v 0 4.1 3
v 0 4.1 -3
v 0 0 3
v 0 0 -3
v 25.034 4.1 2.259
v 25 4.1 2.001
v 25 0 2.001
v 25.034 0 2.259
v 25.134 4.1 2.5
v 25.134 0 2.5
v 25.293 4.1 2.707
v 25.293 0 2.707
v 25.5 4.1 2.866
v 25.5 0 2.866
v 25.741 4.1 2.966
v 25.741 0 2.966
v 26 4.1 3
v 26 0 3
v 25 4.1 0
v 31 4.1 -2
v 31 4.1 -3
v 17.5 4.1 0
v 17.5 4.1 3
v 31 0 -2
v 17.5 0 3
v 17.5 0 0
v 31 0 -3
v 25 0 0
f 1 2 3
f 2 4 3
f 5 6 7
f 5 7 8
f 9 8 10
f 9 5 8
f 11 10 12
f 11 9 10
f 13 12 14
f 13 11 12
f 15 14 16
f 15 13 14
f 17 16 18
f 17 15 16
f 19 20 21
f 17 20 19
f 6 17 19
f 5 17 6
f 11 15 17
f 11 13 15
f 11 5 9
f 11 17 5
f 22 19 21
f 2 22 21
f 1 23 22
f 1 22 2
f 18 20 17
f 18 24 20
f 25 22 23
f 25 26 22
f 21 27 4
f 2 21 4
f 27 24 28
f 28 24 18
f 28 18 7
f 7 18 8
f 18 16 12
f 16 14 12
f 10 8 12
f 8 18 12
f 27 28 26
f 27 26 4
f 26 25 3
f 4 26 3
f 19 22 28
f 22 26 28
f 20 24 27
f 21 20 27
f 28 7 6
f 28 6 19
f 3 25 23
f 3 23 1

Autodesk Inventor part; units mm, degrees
ref_plane "YZ Plane" through (0, 0, 0) normal (1, 0, 0) x (0, 1, 0)
ref_plane "XZ Plane" through (0, 0, 0) normal (0, 1, 0) x (-1, 0, 0)
ref_plane "XY Plane" through (0, 0, 0) normal (0, 0, 1) x (1, 0, 0)
sketch "Skizze5" plane through (0, 0, 0) normal (0, 1, 0) x (-1, 0, 0)
  line L0 (-17.5, 0) -> (-25, 0)
  line L1 (-31, -2) -> (-31, -3)
  line L2 (-31, -3) -> (0, -3)
  line L3 (0, -3) -> (0, 3)
  line L4 (-31, -2) -> (-26, 3)
  line L5 (-26, 3) -> (-25, 3)
  line L6 (-25, 3) -> (-25, 0)
  line L7 (-17.5, 0) -> (-17.5, 3)
  line L8 (-17.5, 3) -> (0, 3)
  point P0 (0, 0)
  point P1 (0, 0)
  dimension "d33" = 3
  dimension "d34" = 45
  dimension "d35" = 1
  dimension "d36" = 1
  dimension "d37" = 3
  dimension "d38" = 6
  dimension "d39" = 7.5
  dimension "d40" = 17.5
extrude "Extrusion4" add sketch "Skizze5" along normal blind 4.1
fillet "Rundung5" radius 1 1 edges at (25, 2.05, 3)
properties part number "P_Wing_Mountingplate_pin"
